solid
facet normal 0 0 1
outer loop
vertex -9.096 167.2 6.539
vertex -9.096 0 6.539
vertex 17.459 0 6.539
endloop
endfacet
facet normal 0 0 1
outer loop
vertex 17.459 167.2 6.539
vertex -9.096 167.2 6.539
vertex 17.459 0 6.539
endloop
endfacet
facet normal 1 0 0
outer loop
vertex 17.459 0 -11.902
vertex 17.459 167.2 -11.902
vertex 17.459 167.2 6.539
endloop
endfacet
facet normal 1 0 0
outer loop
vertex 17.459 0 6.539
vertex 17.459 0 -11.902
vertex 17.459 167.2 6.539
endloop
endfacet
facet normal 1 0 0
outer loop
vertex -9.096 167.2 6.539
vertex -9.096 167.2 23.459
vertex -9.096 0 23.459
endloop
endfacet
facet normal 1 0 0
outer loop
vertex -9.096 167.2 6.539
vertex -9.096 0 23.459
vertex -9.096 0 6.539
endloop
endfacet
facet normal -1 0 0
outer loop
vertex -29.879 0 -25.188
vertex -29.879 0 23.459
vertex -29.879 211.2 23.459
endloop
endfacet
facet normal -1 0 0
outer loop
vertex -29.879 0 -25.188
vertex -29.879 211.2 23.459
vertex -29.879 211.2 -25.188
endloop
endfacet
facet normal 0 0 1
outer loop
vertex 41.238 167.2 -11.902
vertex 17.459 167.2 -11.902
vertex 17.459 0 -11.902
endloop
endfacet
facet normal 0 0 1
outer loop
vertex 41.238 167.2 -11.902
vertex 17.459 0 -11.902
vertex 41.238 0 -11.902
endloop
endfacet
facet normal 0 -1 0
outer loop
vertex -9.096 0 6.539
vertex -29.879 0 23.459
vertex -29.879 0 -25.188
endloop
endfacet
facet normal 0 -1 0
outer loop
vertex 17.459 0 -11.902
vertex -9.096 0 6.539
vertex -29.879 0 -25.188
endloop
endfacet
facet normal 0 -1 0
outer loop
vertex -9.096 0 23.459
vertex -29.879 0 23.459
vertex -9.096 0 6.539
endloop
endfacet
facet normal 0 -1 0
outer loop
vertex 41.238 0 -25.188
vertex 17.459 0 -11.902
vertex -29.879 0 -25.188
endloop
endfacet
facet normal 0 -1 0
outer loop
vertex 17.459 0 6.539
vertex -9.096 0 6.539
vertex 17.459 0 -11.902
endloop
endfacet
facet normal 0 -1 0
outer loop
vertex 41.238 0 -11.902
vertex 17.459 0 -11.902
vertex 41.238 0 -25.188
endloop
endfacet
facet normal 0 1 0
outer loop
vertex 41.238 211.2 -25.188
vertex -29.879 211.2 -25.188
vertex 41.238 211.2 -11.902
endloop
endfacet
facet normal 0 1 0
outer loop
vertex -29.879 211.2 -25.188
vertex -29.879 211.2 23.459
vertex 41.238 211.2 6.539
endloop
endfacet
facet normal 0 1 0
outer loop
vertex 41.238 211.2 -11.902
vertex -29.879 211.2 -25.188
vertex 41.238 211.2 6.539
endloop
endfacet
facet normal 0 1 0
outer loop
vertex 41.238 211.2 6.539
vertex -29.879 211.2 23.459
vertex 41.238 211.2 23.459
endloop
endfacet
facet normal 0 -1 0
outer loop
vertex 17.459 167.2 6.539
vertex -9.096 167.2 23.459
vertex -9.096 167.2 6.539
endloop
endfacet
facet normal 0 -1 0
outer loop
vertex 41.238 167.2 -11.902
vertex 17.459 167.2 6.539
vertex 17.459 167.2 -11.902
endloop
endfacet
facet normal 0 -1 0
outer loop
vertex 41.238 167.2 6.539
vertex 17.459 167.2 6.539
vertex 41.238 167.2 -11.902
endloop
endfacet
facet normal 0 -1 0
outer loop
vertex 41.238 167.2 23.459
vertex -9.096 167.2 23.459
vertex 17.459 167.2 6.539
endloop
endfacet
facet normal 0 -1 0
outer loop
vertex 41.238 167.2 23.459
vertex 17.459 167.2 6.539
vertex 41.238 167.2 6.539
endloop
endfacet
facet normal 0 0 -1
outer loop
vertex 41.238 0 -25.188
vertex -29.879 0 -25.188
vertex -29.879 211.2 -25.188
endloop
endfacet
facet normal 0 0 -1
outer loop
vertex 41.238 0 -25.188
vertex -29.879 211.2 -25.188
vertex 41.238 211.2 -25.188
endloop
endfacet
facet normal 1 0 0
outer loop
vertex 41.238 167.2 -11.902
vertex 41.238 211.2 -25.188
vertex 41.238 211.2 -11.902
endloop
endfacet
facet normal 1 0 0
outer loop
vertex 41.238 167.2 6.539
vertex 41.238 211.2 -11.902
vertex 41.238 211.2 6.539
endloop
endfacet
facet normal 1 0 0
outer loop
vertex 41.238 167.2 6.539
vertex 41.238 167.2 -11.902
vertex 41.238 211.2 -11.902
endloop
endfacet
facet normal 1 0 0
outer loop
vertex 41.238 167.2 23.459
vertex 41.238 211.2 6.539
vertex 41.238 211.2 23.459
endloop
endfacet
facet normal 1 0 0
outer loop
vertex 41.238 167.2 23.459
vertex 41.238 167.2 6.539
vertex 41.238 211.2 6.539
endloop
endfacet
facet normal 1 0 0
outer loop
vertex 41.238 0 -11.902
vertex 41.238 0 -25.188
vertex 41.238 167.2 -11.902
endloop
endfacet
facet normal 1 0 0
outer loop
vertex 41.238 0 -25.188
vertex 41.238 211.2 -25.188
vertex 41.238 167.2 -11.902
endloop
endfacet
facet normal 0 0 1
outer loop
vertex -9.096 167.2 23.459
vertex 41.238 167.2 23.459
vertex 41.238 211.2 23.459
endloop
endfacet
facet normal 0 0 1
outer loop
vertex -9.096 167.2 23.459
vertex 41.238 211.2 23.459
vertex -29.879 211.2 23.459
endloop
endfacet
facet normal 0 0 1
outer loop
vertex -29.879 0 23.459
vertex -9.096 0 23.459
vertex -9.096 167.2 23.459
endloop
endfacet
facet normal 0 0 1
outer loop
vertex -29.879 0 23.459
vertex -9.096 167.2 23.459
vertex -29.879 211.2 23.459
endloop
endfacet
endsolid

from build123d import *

# Parameters (mm, degrees)
F0_W     = 20.7835333422
F0_H     = 16.9197171926
F0_W_2   = 23.7798653543
F0_H_2   = 18.441430293
F1_DEPTH = 211.2
F2_DEPTH = 167.2


with BuildPart() as f1:
    # F0 (on Front) → F1 (new body)
    with BuildSketch(Plane.XZ):
        with Locations((-19.4875816815, 14.9991363287)):
            Rectangle(F0_W, F0_H)
        Polygon((-9.0958150104, 6.5392777324), (-29.8793483526, 6.5392777324), (-29.8793483526, -11.9021525607), (17.4585692585, -11.9021525607), (17.4585692585, 6.5392777324), align=None)
        Polygon((17.4585692585, -11.9021525607), (-29.8793483526, -11.9021525607), (-29.8793483526, -25.1875463873), (41.2384346128, -25.1875463873), (41.2384346128, -11.9021525607), align=None)
        Polygon((41.2384346128, 23.458994925), (-9.0958150104, 23.458994925), (-9.0958150104, 6.5392777324), (17.4585692585, 6.5392777324), (41.2384346128, 6.5392777324), align=None)
        with Locations((29.3485019356, -2.6814374141)):
            Rectangle(F0_W_2, F0_H_2)
    extrude(amount=-F1_DEPTH)

    # F0 (on Front) → F2 (cut)
    with BuildSketch(Plane.XZ):
        Polygon((41.2384346128, 23.458994925), (-9.0958150104, 23.458994925), (-9.0958150104, 6.5392777324), (17.4585692585, 6.5392777324), (41.2384346128, 6.5392777324), align=None)
        with Locations((29.3485019356, -2.6814374141)):
            Rectangle(F0_W_2, F0_H_2)
    extrude(amount=-F2_DEPTH, mode=Mode.SUBTRACT)


solid = f1.part
